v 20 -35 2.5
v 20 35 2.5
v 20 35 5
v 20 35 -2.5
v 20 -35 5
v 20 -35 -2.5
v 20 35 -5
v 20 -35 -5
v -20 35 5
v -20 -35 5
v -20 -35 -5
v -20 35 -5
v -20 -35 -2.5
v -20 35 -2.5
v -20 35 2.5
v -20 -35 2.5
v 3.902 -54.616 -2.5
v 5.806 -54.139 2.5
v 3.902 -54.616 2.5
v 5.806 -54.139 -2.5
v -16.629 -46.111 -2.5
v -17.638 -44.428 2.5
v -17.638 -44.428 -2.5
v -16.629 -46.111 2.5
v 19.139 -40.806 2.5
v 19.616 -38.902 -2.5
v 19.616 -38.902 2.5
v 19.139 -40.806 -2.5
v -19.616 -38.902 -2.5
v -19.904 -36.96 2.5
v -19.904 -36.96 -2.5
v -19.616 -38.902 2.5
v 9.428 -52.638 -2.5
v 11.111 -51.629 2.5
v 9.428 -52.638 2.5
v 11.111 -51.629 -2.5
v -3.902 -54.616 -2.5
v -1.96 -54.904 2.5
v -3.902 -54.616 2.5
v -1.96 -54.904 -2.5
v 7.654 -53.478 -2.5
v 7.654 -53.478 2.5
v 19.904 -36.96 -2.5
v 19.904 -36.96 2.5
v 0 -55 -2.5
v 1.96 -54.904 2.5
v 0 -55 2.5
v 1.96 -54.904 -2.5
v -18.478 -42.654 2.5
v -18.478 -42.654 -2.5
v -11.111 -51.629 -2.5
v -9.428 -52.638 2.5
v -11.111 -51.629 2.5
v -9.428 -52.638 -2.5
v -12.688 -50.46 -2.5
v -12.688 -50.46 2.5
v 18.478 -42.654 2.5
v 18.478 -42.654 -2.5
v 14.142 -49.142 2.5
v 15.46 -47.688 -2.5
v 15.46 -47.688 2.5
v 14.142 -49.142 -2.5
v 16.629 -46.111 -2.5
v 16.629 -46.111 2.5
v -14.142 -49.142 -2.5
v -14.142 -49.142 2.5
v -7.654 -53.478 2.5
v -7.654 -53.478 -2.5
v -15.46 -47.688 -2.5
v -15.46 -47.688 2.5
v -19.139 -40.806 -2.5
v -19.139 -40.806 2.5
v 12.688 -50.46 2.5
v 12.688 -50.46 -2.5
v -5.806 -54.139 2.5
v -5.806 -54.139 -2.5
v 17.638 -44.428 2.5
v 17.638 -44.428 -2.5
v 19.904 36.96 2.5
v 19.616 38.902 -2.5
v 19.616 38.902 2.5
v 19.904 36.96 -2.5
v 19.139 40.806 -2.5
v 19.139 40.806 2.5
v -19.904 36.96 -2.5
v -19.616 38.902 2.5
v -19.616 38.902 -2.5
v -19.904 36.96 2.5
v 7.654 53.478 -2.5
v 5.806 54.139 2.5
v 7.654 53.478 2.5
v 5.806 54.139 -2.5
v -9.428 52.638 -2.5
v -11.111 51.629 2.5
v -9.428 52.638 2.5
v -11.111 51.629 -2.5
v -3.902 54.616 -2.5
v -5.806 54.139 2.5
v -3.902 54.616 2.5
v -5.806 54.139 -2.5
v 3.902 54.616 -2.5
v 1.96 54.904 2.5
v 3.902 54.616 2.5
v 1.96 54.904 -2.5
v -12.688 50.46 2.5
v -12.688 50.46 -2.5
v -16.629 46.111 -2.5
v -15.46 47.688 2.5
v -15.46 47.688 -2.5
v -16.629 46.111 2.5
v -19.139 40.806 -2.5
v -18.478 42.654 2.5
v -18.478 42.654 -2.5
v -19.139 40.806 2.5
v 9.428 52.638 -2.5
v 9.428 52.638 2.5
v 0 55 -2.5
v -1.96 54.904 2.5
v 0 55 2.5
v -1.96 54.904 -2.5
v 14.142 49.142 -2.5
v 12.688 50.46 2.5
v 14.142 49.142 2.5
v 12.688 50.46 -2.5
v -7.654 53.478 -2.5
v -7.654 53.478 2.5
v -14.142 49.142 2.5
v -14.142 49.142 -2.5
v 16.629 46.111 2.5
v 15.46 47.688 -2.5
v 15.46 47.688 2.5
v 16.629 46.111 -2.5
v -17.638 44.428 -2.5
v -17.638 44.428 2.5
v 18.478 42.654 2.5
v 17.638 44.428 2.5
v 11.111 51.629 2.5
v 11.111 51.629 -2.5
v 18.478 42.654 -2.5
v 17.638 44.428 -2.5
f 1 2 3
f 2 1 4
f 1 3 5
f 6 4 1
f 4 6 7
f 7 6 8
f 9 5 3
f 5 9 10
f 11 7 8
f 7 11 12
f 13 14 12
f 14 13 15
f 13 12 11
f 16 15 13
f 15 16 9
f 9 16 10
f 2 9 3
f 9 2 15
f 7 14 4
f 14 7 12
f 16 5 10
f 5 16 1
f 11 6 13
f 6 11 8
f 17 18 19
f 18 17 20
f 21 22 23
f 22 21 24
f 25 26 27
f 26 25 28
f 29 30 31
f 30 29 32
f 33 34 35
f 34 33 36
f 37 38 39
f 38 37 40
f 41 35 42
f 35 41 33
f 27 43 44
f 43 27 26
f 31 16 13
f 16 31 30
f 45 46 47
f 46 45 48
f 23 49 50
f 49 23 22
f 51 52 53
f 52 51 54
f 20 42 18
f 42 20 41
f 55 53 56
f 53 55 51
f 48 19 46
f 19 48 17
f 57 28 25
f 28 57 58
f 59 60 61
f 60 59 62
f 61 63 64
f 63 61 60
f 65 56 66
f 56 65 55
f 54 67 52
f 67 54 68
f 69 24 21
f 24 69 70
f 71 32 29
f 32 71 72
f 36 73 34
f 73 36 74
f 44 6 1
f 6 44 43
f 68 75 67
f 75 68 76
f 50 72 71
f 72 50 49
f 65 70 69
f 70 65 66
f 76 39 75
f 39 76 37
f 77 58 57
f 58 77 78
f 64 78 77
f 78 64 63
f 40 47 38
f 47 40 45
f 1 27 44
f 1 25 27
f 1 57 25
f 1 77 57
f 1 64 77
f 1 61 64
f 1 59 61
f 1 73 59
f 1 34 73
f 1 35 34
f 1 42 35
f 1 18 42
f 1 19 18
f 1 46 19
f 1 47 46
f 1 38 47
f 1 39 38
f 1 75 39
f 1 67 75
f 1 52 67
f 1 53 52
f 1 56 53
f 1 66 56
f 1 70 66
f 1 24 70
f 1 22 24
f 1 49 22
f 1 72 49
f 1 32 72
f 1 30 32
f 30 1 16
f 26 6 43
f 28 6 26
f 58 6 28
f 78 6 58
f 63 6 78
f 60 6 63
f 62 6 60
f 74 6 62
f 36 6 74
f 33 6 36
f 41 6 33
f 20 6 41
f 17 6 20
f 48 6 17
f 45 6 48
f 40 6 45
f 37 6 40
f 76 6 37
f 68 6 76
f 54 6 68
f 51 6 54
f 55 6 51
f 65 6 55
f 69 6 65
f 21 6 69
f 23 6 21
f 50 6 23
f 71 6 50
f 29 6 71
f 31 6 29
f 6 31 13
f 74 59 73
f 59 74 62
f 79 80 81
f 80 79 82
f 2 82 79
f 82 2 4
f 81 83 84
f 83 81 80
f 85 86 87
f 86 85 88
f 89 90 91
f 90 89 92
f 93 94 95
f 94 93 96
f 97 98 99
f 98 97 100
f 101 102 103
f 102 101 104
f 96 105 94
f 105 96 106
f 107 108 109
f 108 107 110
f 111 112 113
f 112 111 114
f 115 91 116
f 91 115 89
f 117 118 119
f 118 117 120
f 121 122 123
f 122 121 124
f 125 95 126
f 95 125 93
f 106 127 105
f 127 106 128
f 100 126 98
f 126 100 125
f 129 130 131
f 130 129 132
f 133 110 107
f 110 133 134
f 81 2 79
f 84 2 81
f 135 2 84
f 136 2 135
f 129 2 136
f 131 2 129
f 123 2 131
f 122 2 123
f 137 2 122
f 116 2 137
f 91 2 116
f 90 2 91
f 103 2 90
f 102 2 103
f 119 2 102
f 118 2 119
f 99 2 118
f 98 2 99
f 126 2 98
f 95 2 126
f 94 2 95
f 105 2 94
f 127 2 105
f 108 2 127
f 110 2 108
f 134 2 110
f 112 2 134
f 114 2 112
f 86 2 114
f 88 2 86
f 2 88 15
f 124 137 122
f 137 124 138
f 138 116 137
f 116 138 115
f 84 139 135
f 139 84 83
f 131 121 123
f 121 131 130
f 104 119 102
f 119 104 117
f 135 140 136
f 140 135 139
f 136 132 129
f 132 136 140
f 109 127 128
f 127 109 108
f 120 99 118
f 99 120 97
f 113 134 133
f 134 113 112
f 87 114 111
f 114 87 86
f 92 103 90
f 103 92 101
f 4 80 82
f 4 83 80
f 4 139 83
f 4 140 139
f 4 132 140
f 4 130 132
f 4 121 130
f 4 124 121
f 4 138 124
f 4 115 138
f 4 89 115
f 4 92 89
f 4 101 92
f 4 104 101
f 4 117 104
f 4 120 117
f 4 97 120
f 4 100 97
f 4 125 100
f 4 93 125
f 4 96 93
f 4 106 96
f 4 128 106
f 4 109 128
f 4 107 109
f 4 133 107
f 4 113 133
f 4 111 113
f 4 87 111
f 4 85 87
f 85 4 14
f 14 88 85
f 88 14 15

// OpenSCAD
//cube (10,center=true);
$fn = 64;
cube ([40,70,10], center=true);
color ("red")
translate ([0, -70/2, 0])
cylinder (h=5, d=40, center=true);
cube ([40,70,10], center=true);
color ("green")
translate ([0, 70/2, 0])
cylinder (h=5, d=40, center=true);
